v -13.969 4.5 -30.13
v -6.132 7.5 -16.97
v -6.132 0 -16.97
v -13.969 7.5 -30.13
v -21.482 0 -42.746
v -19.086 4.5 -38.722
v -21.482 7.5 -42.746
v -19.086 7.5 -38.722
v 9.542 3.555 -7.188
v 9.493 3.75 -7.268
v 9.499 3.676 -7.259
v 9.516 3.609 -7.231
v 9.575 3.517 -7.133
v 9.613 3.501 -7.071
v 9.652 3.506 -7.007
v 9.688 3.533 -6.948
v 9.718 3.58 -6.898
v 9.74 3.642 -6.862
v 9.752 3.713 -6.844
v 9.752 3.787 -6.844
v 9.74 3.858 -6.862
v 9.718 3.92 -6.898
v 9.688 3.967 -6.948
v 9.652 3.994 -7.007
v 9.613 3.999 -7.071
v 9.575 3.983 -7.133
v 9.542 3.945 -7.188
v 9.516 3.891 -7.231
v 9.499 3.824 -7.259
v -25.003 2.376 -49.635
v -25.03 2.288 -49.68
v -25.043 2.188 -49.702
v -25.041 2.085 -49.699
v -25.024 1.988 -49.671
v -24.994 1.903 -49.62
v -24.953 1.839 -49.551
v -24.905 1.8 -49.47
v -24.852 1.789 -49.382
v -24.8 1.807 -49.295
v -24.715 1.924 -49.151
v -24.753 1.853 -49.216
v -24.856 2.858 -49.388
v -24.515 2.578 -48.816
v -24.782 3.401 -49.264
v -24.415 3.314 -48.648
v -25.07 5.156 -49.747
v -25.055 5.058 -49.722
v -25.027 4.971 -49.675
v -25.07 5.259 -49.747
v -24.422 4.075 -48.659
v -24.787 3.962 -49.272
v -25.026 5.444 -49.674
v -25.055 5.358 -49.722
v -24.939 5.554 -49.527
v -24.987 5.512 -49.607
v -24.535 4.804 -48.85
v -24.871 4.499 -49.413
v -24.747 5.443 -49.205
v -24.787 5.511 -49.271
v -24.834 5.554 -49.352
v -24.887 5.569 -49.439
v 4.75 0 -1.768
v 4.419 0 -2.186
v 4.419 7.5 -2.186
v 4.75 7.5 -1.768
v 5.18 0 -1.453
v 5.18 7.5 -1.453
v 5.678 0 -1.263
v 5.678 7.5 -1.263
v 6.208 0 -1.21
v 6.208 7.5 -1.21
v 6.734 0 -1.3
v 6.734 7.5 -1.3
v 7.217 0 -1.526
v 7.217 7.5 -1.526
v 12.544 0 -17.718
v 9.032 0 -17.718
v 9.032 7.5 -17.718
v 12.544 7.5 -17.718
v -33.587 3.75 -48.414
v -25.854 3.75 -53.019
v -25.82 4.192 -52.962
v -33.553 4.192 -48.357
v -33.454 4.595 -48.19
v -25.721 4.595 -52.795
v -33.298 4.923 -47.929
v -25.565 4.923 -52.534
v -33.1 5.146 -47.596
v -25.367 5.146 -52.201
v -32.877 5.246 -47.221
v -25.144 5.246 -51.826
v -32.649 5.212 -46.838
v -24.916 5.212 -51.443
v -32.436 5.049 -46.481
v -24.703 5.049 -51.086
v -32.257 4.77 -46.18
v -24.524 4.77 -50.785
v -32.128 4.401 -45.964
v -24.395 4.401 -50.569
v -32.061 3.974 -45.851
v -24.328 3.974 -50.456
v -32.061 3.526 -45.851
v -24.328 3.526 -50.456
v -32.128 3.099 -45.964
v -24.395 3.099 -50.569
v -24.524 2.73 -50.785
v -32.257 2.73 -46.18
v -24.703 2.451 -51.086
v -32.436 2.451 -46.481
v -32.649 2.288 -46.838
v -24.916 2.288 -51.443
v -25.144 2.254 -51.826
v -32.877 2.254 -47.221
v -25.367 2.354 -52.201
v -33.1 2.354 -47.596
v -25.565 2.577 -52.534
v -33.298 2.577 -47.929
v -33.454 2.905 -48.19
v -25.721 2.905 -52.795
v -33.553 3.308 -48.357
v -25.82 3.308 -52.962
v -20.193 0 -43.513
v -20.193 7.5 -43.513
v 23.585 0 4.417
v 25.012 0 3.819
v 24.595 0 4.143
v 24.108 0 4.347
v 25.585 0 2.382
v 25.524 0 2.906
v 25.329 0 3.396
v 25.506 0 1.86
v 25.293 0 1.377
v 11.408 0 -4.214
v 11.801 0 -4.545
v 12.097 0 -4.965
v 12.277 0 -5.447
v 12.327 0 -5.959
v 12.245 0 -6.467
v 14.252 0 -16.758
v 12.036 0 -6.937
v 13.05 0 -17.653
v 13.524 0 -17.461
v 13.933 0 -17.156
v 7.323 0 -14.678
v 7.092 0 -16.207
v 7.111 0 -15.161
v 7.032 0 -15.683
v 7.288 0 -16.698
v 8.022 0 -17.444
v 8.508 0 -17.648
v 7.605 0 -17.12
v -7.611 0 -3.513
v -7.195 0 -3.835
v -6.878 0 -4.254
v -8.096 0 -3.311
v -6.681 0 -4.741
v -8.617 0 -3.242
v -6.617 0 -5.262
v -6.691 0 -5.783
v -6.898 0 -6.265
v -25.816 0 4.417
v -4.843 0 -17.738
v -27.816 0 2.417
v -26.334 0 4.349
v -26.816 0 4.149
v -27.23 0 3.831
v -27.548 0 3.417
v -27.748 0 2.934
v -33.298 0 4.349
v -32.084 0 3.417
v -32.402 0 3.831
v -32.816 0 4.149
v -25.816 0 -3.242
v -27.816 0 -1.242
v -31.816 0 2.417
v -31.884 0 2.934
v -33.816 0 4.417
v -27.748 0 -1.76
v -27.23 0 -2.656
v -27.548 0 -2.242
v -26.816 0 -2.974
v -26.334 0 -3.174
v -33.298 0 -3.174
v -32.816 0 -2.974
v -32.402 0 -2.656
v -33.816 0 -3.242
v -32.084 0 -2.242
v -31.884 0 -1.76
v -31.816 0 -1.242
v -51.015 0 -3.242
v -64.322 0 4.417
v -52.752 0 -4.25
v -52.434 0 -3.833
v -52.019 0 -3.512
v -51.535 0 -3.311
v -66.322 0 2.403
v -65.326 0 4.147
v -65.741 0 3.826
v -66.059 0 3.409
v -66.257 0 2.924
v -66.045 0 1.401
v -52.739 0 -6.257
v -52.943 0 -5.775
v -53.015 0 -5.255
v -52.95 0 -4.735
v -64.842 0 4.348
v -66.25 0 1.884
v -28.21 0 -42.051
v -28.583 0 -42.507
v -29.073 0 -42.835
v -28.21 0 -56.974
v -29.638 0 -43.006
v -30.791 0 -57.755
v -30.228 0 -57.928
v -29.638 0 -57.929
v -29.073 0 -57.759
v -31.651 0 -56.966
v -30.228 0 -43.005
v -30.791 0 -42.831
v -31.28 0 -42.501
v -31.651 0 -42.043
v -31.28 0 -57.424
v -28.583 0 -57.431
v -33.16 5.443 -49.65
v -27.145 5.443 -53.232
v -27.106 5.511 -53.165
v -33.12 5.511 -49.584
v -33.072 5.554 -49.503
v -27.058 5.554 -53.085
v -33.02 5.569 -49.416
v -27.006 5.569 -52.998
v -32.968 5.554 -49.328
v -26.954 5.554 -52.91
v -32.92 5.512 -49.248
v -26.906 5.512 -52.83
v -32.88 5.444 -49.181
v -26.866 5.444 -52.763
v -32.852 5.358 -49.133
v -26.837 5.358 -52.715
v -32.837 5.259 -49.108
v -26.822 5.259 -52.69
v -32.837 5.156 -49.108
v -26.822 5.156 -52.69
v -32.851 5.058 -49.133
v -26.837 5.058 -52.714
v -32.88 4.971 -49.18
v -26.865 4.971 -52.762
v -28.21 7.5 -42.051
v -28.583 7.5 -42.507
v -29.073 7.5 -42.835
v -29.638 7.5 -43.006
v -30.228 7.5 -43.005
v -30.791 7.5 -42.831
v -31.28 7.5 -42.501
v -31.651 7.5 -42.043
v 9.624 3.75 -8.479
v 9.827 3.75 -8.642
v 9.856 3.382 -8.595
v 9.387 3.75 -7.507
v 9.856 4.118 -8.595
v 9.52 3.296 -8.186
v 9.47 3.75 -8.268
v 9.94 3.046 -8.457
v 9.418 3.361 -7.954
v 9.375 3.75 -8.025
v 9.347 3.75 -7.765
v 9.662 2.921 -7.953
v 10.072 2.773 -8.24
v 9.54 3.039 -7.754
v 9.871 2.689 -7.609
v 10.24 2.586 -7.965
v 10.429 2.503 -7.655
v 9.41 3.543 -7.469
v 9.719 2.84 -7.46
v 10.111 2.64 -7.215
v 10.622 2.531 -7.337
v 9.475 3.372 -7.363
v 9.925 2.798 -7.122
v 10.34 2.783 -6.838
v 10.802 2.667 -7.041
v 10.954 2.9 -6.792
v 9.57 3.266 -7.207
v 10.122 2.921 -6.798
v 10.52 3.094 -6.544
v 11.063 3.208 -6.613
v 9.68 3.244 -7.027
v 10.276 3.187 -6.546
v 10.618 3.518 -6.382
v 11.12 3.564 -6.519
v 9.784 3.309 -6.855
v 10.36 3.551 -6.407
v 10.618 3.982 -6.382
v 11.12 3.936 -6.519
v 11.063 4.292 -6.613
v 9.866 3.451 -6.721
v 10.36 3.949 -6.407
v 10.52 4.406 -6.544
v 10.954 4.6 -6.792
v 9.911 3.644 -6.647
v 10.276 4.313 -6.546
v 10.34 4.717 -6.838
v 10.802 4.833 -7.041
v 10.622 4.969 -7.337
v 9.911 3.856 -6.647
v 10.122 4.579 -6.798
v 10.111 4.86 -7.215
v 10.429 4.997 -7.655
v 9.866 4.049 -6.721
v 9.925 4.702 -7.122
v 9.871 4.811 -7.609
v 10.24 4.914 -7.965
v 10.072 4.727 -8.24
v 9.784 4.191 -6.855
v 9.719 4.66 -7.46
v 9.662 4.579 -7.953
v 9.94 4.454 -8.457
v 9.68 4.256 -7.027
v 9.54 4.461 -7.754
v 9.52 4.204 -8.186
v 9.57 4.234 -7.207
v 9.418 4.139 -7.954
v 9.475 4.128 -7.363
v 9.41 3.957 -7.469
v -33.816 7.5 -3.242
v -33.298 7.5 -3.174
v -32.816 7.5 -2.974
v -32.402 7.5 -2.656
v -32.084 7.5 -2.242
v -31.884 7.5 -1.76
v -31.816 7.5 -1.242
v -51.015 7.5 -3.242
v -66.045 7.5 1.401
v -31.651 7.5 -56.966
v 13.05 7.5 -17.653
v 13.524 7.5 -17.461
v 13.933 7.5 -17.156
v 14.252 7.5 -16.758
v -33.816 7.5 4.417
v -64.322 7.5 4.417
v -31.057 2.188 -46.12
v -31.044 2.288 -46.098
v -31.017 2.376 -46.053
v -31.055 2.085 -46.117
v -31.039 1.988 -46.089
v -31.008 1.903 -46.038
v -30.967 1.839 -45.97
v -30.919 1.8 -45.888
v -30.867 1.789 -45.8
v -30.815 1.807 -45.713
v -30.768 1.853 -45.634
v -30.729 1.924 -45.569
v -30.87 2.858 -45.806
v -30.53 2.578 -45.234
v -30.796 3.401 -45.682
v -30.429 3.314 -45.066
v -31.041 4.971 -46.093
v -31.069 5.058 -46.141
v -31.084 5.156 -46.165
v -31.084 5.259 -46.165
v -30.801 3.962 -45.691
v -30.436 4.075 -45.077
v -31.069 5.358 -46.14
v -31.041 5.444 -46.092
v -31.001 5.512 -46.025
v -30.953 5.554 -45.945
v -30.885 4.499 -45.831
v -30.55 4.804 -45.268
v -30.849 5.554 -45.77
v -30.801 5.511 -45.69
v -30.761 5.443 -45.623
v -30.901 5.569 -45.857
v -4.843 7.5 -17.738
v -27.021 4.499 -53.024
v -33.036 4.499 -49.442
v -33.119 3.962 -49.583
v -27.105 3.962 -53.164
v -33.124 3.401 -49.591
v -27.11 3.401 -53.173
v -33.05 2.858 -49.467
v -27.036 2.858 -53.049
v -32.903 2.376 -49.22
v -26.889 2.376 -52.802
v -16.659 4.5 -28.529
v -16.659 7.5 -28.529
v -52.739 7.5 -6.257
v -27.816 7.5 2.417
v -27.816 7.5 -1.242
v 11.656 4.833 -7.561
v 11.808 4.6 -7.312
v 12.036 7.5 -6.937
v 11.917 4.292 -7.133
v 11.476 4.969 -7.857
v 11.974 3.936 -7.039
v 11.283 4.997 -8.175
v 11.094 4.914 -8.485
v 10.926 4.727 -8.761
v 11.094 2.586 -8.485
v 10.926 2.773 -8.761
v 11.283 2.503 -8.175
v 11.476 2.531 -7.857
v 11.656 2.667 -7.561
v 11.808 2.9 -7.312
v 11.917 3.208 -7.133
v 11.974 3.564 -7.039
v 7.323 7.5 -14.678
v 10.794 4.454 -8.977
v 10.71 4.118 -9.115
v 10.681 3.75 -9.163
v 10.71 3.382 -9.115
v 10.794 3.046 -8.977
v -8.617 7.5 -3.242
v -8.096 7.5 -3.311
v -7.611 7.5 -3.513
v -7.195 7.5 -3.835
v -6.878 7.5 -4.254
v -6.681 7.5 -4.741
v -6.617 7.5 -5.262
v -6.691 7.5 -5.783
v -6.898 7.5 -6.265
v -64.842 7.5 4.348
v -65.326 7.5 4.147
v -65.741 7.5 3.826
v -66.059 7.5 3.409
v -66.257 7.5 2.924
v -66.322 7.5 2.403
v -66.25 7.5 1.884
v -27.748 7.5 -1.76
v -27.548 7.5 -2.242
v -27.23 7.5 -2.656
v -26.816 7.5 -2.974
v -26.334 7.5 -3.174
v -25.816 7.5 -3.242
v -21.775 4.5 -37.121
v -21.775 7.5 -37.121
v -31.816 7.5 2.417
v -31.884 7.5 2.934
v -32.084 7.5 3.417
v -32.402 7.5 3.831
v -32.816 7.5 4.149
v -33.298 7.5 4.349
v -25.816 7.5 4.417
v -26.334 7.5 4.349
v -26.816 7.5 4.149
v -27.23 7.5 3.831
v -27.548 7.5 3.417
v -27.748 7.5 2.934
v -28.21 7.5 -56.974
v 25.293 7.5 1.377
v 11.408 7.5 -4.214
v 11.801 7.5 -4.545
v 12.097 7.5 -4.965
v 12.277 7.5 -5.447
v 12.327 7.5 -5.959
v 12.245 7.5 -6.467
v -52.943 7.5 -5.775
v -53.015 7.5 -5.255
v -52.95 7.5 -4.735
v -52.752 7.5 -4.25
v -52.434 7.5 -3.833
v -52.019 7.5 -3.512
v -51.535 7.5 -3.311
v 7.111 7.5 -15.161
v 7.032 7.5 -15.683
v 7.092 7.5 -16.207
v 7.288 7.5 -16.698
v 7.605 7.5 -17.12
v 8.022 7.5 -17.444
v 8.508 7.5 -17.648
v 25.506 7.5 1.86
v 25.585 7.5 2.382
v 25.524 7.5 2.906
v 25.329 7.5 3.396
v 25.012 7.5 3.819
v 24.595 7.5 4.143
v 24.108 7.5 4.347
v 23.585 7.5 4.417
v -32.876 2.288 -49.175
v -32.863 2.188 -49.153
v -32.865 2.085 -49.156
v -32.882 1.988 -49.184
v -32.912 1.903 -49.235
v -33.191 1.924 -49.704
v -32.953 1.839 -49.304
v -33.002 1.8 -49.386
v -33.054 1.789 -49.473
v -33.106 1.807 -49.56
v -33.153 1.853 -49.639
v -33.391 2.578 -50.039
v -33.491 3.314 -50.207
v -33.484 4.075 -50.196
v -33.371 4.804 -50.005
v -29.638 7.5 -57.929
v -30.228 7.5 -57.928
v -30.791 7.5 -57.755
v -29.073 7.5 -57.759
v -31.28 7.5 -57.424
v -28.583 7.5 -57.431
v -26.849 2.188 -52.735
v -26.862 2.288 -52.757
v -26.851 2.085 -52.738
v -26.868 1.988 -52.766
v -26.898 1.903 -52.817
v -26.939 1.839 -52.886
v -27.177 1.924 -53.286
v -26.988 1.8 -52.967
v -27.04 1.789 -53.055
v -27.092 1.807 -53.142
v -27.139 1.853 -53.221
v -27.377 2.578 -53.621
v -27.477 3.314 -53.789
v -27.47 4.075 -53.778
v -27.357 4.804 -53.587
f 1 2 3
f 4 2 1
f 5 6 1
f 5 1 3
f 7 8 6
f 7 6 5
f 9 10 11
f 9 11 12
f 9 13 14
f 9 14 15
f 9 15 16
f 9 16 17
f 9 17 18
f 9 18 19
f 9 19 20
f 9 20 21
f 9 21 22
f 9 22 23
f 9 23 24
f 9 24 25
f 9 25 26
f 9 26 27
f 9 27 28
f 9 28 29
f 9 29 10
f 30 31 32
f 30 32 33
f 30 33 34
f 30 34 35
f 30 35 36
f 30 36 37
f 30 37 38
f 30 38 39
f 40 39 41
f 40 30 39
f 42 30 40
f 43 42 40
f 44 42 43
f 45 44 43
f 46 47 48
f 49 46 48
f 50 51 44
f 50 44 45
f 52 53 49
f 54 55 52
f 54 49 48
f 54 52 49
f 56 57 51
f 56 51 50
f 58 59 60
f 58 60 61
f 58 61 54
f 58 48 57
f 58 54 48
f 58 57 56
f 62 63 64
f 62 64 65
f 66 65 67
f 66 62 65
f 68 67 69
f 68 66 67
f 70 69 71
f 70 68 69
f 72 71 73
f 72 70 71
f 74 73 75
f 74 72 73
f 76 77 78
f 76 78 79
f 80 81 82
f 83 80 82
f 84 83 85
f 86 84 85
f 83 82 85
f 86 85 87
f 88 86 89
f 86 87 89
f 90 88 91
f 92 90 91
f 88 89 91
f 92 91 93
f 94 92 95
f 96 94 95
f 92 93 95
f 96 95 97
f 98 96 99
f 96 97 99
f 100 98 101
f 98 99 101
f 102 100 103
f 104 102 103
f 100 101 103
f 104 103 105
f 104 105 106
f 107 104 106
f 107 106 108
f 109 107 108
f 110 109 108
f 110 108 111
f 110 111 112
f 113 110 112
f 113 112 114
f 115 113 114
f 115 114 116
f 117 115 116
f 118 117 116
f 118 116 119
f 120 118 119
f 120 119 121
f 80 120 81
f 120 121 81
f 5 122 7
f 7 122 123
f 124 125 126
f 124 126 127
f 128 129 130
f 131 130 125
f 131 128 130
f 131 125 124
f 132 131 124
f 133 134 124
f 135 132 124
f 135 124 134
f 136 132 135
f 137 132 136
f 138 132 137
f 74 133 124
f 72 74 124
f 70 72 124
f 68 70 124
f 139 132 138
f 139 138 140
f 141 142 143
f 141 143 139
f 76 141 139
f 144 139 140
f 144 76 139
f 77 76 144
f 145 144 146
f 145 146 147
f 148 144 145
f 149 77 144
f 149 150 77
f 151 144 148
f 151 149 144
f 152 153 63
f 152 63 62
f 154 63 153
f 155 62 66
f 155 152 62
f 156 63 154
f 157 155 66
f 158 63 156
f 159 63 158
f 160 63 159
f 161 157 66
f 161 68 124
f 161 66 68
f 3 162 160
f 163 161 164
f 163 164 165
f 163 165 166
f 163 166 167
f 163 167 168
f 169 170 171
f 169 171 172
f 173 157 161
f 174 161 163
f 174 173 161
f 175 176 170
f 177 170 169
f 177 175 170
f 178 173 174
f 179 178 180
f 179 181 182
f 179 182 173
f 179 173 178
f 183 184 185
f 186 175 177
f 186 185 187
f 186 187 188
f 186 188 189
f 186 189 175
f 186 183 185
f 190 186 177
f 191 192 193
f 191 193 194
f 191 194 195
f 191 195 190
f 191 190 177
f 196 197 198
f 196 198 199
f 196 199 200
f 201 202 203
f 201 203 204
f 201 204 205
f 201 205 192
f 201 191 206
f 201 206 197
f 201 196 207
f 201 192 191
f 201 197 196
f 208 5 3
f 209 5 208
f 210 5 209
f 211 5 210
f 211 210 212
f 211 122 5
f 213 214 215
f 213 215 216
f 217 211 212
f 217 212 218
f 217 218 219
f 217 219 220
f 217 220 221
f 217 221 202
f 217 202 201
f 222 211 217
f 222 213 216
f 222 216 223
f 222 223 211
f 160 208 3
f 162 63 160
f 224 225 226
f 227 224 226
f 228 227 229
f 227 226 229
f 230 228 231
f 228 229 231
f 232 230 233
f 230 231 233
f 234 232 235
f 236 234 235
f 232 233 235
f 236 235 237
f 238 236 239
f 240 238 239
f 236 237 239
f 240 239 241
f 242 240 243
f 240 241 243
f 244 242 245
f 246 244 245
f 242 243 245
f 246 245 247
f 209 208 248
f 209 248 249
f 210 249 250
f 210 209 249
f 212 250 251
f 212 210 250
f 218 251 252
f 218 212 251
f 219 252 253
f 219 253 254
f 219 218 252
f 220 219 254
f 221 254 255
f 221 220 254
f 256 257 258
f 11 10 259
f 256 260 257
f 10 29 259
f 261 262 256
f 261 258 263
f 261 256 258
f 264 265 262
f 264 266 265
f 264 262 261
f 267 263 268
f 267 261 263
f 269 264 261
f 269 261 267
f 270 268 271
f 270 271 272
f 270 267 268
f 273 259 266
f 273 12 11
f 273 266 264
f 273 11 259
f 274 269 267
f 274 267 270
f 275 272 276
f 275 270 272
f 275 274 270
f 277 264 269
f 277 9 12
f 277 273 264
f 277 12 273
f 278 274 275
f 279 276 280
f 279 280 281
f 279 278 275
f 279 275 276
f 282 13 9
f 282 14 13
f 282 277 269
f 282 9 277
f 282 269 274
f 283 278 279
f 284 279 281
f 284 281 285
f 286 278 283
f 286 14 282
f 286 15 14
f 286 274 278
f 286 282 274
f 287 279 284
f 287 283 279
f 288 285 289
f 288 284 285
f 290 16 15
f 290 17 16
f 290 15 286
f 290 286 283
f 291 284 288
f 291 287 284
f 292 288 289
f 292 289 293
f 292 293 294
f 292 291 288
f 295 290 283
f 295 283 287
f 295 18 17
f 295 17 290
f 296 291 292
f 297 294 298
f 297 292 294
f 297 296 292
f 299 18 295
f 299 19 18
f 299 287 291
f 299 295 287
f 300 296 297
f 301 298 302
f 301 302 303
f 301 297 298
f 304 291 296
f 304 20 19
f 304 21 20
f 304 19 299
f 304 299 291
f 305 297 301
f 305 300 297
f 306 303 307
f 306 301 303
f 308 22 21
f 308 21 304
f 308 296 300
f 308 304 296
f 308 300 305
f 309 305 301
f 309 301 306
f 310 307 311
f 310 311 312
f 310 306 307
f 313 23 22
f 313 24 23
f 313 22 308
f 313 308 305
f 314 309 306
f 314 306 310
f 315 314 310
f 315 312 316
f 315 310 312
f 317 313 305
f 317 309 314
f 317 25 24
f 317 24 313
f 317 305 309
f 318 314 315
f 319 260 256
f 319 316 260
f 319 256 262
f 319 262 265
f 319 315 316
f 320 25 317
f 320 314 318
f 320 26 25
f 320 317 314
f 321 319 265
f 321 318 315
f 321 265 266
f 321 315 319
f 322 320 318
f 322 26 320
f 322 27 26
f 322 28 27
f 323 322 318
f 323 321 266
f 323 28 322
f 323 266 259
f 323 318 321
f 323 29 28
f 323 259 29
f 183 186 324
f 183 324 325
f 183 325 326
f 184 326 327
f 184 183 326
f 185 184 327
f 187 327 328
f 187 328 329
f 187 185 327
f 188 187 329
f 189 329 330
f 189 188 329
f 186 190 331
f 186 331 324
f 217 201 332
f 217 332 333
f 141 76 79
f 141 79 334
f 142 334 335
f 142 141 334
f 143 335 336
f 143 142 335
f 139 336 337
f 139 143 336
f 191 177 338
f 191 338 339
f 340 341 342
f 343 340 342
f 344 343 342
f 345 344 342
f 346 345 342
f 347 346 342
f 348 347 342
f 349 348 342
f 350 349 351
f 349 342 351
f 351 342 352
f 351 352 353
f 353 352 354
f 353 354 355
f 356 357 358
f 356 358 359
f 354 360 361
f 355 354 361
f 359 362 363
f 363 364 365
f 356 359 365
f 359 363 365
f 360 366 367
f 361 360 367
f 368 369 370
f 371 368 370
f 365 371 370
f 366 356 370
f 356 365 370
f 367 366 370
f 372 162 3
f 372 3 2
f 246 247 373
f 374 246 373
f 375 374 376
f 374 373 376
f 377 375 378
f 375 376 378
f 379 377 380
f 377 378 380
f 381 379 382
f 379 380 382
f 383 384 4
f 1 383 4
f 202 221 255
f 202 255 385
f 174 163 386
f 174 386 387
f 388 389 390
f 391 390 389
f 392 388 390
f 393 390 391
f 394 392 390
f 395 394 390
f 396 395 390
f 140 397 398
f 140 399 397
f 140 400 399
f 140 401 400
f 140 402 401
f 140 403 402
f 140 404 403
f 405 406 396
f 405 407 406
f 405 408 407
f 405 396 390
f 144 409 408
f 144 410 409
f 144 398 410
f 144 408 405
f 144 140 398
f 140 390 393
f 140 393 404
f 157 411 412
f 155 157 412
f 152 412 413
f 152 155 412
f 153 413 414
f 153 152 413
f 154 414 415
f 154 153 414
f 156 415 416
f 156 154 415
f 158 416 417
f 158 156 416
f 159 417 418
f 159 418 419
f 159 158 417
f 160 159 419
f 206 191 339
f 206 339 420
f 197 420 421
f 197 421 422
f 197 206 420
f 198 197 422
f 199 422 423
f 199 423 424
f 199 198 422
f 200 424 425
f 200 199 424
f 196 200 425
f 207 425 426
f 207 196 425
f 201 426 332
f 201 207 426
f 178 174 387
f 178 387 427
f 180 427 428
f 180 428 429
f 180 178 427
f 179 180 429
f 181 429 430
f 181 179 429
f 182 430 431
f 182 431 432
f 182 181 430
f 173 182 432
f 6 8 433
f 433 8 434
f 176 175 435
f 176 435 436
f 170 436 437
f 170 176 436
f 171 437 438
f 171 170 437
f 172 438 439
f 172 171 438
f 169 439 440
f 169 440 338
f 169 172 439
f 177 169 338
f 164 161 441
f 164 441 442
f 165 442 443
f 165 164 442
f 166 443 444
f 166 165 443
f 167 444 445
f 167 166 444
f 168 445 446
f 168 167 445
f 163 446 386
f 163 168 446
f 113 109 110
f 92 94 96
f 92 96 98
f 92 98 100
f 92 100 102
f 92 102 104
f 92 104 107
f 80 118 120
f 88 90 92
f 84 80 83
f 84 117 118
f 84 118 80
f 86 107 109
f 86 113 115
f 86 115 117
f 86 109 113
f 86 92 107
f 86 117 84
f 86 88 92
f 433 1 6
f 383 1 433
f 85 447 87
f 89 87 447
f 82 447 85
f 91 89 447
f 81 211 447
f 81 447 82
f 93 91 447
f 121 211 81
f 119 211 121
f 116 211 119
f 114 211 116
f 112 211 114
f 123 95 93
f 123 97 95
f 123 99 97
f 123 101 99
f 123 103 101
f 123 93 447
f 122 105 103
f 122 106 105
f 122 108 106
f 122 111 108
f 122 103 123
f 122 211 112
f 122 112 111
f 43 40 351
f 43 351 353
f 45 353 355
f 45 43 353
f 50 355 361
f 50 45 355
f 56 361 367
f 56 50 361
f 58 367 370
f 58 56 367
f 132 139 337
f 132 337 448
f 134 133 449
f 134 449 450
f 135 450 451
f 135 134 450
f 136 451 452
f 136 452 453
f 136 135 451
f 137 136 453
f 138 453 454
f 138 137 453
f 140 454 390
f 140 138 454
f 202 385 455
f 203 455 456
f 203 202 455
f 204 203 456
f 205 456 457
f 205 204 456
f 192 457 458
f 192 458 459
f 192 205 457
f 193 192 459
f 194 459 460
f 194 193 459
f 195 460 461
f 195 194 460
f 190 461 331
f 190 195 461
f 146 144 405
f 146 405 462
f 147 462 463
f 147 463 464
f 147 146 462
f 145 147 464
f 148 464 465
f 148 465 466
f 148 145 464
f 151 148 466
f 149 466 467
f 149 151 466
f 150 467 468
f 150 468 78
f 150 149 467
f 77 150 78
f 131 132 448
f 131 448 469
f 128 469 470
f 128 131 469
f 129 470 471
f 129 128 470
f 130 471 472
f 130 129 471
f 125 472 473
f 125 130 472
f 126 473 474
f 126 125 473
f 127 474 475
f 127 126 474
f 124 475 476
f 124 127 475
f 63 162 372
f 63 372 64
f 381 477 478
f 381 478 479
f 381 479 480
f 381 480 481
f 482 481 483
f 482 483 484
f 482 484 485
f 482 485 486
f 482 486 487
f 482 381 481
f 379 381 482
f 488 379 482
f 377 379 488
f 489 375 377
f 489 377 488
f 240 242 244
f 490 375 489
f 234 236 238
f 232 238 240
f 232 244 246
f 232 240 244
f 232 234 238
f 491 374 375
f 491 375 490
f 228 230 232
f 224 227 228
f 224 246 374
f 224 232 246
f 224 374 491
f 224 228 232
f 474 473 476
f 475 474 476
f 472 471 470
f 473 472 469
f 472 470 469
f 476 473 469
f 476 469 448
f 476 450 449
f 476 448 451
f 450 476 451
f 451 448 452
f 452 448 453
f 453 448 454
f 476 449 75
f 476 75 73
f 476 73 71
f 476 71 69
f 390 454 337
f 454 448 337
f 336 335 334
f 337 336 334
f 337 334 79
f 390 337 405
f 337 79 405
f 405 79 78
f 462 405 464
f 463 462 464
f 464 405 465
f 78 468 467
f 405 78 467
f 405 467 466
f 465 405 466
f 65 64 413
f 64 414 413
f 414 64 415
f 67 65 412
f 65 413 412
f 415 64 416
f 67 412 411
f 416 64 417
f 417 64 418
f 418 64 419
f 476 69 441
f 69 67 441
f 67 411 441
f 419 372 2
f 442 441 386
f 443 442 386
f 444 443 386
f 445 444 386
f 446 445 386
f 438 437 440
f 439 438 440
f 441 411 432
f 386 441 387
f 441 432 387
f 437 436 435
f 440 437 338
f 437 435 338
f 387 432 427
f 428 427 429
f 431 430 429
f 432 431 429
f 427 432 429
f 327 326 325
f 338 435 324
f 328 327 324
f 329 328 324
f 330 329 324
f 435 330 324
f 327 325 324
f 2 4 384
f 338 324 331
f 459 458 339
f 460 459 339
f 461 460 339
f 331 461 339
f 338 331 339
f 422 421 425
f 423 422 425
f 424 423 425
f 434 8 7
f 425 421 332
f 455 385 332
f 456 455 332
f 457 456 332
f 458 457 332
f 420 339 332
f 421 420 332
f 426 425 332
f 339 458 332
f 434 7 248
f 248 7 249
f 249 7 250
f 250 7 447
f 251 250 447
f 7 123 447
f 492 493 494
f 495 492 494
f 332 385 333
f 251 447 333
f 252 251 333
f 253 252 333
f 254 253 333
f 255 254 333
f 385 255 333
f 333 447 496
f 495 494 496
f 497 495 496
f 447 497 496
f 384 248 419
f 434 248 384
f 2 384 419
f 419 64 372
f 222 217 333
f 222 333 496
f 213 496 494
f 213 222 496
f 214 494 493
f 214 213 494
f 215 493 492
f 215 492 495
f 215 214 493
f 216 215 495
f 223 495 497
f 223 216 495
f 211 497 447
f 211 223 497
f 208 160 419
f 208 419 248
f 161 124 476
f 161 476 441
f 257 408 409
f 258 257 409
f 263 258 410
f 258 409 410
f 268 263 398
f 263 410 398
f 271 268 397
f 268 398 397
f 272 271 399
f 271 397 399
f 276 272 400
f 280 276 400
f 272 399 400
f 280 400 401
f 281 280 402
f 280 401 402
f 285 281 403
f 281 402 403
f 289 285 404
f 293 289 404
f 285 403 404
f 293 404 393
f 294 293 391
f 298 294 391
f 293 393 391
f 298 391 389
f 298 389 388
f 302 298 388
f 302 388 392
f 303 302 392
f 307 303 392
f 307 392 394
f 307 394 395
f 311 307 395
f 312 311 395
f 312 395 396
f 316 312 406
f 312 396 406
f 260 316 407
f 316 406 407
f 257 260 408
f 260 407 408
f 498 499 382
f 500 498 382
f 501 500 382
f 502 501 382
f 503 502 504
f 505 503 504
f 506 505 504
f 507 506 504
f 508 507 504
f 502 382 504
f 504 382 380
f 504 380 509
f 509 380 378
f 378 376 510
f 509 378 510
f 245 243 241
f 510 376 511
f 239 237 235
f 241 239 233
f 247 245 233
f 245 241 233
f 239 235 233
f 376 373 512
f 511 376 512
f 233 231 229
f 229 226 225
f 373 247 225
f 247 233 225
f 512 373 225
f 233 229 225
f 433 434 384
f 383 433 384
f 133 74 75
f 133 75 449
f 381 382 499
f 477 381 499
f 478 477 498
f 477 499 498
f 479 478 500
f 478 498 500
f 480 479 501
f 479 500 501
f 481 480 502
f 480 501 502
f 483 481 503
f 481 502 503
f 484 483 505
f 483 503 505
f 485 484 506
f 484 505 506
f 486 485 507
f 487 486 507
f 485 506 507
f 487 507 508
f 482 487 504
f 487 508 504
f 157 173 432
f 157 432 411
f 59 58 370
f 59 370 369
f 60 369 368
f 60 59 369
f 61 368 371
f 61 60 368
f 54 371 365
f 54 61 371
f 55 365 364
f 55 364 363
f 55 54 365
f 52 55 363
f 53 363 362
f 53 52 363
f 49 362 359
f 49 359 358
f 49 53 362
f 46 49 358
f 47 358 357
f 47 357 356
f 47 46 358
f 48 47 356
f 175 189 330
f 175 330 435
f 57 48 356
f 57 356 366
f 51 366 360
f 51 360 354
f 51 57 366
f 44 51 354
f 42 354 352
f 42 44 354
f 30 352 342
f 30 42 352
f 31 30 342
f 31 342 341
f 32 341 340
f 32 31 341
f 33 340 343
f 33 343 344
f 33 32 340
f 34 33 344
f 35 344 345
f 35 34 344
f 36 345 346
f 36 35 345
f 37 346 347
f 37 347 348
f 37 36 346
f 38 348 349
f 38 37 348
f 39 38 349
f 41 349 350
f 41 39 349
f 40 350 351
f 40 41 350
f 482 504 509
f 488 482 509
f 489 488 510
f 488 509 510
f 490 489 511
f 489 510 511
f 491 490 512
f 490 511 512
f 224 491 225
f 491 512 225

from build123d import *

# Parameters (mm, degrees)
BOSS_EXTRUDE1_DEPTH = 7.5
SKETCH2_R           = 1.5
CUT_EXTRUDE1_DEPTH  = 9
CUT_EXTRUDE4_DEPTH  = 7
SKETCH6_R           = 1.25
BOSS_EXTRUDE2_DEPTH = 2
FILLET1_R           = 1
CUT_EXTRUDE5_DEPTH  = 3
SKETCH8_W           = 30
SKETCH8_H           = 7.5
CUT_EXTRUDE6_DEPTH  = 1.5


with BuildPart() as part:
    # Sketch1 → Boss-Extrude1 (new body)
    with BuildSketch(Plane(origin=(0, 0, 0), x_dir=(1, 0, 0), z_dir=(0, 1, 0))):
        with BuildLine():
            Line((0.6, -4.416738673), (-25.816064279, -4.416738673))
            ThreePointArc((-25.816064279, -4.416738673), (-27.230277841, -3.830952235), (-27.816064279, -2.416738673))
            Line((-27.816064279, -2.416738673), (-27.816064279, 1.242047676))
            ThreePointArc((-27.816064279, 1.242047676), (-27.230277841, 2.656261238), (-25.816064279, 3.242047676))
            Line((-25.816064279, 3.242047676), (-8.616701404, 3.242047676))
            ThreePointArc((-8.616701404, 3.242047676), (-6.877923642, 4.253790678), (-6.898342112, 6.265395781))
            Line((-6.898342112, 6.265395781), (-28.209840808, 42.050688808))
            ThreePointArc((-28.209840808, 42.050688808), (-29.932839186, 43.027335323), (-31.651288288, 42.042706201))
            Line((-31.651288288, 42.042706201), (-52.738515342, 6.257413174))
            ThreePointArc((-52.738515342, 6.257413174), (-52.751907933, 4.249760166), (-51.015427154, 3.242047676))
            Line((-51.015427154, 3.242047676), (-33.816064279, 3.242047676))
            ThreePointArc((-33.816064279, 3.242047676), (-32.401850716, 2.656261238), (-31.816064279, 1.242047676))
            Line((-31.816064279, 1.242047676), (-31.816064279, -2.416738673))
            ThreePointArc((-31.816064279, -2.416738673), (-32.401850716, -3.830952235), (-33.816064279, -4.416738673))
            Line((-33.816064279, -4.416738673), (-64.322377342, -4.416738673))
            ThreePointArc((-64.322377342, -4.416738673), (-66.058858122, -3.409026183), (-66.045465531, -1.401373175))
            Line((-66.045465531, -1.401373175), (-31.651288288, 56.965983893))
            ThreePointArc((-31.651288288, 56.965983893), (-29.932839186, 57.950613015), (-28.209840808, 56.973966501))
            Line((-28.209840808, 56.973966501), (4.418617661, 2.185752684))
            ThreePointArc((4.418617661, 2.185752684), (5.677744474, 1.262538298), (7.216741926, 1.52561999))
            Line((7.216741926, 1.52561999), (11.407599177, 4.21358701))
            ThreePointArc((11.407599177, 4.21358701), (12.276616363, 5.447347792), (12.036115602, 6.93715178))
            Line((12.036115602, 6.93715178), (7.323304576, 14.677687772))
            ThreePointArc((7.323304576, 14.677687772), (7.288002317, 16.697524788), (9.031585974, 17.717771743))
            Line((9.031585974, 17.717771743), (12.543887874, 17.717771743))
            ThreePointArc((12.543887874, 17.717771743), (13.523640919, 17.4613554), (14.252169272, 16.757855713))
            Line((14.252169272, 16.757855713), (25.293332405, -1.376654703))
            ThreePointArc((25.293332405, -1.376654703), (25.328634664, -3.396491718), (23.585051007, -4.416738673))
            Line((23.585051007, -4.416738673), (0.6, -4.416738673))
        make_face()
    extrude(amount=BOSS_EXTRUDE1_DEPTH)

    # Sketch2 → Cut-Extrude1 (cut)
    with BuildSketch(Plane(origin=(4.222678331, 0, -2.514765037), x_dir=(-0.5116740525225859, 0, -0.8591796459269238), z_dir=(0.8591796459269239, 0, -0.5116740525225859))):
        with Locations((57.281755723, 3.75)):
            Circle(SKETCH2_R)
    extrude(amount=-CUT_EXTRUDE1_DEPTH, mode=Mode.SUBTRACT)

    # Sketch5 → Cut-Extrude4 (cut)
    with BuildSketch(Plane(origin=(3.363498685, 0, -2.003090985), x_dir=(-0.5116740525225859, 0, -0.8591796459269238), z_dir=(0.8591796459269239, 0, -0.5116740525225859))):
        with BuildLine():
            ThreePointArc((59.687787147, 1.923672452), (60.293645506, 3.69481399), (59.625444471, 5.443388859))
            ThreePointArc((59.625444471, 5.443388859), (59.11581554, 5.480697337), (59.078507063, 4.971068407))
            ThreePointArc((59.078507063, 4.971068407), (59.57110599, 3.68201607), (59.124466188, 2.376327548))
            ThreePointArc((59.124466188, 2.376327548), (59.179799119, 1.868339521), (59.687787147, 1.923672452))
        make_face()
        with BuildLine():
            ThreePointArc((54.875724299, 1.923672452), (54.26986594, 3.69481399), (54.938066975, 5.443388859))
            ThreePointArc((54.938066975, 5.443388859), (55.447695906, 5.480697337), (55.485004384, 4.971068407))
            ThreePointArc((55.485004384, 4.971068407), (54.992405456, 3.68201607), (55.439045258, 2.376327548))
            ThreePointArc((55.439045258, 2.376327548), (55.383712327, 1.868339521), (54.875724299, 1.923672452))
        make_face()
    extrude(amount=-CUT_EXTRUDE4_DEPTH, mode=Mode.SUBTRACT)

    # Sketch6 → Boss-Extrude2 (add)
    with BuildSketch(Plane(origin=(11.862431053, 0, -7.222419211), x_dir=(0.5200419851467809, 0, 0.8541406989978848), z_dir=(-0.8541406989978848, 0, 0.5200419851467809))):
        with Locations(Location((-1.021383997, 3.75, 0), (0, 0, 180))):
            Circle(SKETCH6_R)
    extrude(amount=BOSS_EXTRUDE2_DEPTH)

    # Fillet1
    fillet1_edges = [part.edges().sort_by_distance(p)[0] for p in [
        (10.273039575, 3.75, -5.987065009),
    ]]
    fillet(fillet1_edges, radius=FILLET1_R)

    # Sketch7 → Cut-Extrude5 (cut)
    with BuildSketch(Plane.XZ.offset(-7.5)):
        Polygon((-17.79728073, -39.489672278), (-21.775246759, -37.120642694), (-16.658506234, -28.528846235), (-12.680540205, -30.897875819), align=None)
    extrude(amount=CUT_EXTRUDE5_DEPTH, mode=Mode.SUBTRACT)

    # Sketch8 → Cut-Extrude6 (cut)
    with BuildSketch(Plane(origin=(4.222678331, 0, -2.514765037), x_dir=(-0.5116740525225859, 0, -0.8591796459269238), z_dir=(0.8591796459269239, 0, -0.5116740525225859))):
        with Locations((32.718162055, 3.75)):
            Rectangle(SKETCH8_W, SKETCH8_H)
    extrude(amount=-CUT_EXTRUDE6_DEPTH, mode=Mode.SUBTRACT)


solid = part.part
